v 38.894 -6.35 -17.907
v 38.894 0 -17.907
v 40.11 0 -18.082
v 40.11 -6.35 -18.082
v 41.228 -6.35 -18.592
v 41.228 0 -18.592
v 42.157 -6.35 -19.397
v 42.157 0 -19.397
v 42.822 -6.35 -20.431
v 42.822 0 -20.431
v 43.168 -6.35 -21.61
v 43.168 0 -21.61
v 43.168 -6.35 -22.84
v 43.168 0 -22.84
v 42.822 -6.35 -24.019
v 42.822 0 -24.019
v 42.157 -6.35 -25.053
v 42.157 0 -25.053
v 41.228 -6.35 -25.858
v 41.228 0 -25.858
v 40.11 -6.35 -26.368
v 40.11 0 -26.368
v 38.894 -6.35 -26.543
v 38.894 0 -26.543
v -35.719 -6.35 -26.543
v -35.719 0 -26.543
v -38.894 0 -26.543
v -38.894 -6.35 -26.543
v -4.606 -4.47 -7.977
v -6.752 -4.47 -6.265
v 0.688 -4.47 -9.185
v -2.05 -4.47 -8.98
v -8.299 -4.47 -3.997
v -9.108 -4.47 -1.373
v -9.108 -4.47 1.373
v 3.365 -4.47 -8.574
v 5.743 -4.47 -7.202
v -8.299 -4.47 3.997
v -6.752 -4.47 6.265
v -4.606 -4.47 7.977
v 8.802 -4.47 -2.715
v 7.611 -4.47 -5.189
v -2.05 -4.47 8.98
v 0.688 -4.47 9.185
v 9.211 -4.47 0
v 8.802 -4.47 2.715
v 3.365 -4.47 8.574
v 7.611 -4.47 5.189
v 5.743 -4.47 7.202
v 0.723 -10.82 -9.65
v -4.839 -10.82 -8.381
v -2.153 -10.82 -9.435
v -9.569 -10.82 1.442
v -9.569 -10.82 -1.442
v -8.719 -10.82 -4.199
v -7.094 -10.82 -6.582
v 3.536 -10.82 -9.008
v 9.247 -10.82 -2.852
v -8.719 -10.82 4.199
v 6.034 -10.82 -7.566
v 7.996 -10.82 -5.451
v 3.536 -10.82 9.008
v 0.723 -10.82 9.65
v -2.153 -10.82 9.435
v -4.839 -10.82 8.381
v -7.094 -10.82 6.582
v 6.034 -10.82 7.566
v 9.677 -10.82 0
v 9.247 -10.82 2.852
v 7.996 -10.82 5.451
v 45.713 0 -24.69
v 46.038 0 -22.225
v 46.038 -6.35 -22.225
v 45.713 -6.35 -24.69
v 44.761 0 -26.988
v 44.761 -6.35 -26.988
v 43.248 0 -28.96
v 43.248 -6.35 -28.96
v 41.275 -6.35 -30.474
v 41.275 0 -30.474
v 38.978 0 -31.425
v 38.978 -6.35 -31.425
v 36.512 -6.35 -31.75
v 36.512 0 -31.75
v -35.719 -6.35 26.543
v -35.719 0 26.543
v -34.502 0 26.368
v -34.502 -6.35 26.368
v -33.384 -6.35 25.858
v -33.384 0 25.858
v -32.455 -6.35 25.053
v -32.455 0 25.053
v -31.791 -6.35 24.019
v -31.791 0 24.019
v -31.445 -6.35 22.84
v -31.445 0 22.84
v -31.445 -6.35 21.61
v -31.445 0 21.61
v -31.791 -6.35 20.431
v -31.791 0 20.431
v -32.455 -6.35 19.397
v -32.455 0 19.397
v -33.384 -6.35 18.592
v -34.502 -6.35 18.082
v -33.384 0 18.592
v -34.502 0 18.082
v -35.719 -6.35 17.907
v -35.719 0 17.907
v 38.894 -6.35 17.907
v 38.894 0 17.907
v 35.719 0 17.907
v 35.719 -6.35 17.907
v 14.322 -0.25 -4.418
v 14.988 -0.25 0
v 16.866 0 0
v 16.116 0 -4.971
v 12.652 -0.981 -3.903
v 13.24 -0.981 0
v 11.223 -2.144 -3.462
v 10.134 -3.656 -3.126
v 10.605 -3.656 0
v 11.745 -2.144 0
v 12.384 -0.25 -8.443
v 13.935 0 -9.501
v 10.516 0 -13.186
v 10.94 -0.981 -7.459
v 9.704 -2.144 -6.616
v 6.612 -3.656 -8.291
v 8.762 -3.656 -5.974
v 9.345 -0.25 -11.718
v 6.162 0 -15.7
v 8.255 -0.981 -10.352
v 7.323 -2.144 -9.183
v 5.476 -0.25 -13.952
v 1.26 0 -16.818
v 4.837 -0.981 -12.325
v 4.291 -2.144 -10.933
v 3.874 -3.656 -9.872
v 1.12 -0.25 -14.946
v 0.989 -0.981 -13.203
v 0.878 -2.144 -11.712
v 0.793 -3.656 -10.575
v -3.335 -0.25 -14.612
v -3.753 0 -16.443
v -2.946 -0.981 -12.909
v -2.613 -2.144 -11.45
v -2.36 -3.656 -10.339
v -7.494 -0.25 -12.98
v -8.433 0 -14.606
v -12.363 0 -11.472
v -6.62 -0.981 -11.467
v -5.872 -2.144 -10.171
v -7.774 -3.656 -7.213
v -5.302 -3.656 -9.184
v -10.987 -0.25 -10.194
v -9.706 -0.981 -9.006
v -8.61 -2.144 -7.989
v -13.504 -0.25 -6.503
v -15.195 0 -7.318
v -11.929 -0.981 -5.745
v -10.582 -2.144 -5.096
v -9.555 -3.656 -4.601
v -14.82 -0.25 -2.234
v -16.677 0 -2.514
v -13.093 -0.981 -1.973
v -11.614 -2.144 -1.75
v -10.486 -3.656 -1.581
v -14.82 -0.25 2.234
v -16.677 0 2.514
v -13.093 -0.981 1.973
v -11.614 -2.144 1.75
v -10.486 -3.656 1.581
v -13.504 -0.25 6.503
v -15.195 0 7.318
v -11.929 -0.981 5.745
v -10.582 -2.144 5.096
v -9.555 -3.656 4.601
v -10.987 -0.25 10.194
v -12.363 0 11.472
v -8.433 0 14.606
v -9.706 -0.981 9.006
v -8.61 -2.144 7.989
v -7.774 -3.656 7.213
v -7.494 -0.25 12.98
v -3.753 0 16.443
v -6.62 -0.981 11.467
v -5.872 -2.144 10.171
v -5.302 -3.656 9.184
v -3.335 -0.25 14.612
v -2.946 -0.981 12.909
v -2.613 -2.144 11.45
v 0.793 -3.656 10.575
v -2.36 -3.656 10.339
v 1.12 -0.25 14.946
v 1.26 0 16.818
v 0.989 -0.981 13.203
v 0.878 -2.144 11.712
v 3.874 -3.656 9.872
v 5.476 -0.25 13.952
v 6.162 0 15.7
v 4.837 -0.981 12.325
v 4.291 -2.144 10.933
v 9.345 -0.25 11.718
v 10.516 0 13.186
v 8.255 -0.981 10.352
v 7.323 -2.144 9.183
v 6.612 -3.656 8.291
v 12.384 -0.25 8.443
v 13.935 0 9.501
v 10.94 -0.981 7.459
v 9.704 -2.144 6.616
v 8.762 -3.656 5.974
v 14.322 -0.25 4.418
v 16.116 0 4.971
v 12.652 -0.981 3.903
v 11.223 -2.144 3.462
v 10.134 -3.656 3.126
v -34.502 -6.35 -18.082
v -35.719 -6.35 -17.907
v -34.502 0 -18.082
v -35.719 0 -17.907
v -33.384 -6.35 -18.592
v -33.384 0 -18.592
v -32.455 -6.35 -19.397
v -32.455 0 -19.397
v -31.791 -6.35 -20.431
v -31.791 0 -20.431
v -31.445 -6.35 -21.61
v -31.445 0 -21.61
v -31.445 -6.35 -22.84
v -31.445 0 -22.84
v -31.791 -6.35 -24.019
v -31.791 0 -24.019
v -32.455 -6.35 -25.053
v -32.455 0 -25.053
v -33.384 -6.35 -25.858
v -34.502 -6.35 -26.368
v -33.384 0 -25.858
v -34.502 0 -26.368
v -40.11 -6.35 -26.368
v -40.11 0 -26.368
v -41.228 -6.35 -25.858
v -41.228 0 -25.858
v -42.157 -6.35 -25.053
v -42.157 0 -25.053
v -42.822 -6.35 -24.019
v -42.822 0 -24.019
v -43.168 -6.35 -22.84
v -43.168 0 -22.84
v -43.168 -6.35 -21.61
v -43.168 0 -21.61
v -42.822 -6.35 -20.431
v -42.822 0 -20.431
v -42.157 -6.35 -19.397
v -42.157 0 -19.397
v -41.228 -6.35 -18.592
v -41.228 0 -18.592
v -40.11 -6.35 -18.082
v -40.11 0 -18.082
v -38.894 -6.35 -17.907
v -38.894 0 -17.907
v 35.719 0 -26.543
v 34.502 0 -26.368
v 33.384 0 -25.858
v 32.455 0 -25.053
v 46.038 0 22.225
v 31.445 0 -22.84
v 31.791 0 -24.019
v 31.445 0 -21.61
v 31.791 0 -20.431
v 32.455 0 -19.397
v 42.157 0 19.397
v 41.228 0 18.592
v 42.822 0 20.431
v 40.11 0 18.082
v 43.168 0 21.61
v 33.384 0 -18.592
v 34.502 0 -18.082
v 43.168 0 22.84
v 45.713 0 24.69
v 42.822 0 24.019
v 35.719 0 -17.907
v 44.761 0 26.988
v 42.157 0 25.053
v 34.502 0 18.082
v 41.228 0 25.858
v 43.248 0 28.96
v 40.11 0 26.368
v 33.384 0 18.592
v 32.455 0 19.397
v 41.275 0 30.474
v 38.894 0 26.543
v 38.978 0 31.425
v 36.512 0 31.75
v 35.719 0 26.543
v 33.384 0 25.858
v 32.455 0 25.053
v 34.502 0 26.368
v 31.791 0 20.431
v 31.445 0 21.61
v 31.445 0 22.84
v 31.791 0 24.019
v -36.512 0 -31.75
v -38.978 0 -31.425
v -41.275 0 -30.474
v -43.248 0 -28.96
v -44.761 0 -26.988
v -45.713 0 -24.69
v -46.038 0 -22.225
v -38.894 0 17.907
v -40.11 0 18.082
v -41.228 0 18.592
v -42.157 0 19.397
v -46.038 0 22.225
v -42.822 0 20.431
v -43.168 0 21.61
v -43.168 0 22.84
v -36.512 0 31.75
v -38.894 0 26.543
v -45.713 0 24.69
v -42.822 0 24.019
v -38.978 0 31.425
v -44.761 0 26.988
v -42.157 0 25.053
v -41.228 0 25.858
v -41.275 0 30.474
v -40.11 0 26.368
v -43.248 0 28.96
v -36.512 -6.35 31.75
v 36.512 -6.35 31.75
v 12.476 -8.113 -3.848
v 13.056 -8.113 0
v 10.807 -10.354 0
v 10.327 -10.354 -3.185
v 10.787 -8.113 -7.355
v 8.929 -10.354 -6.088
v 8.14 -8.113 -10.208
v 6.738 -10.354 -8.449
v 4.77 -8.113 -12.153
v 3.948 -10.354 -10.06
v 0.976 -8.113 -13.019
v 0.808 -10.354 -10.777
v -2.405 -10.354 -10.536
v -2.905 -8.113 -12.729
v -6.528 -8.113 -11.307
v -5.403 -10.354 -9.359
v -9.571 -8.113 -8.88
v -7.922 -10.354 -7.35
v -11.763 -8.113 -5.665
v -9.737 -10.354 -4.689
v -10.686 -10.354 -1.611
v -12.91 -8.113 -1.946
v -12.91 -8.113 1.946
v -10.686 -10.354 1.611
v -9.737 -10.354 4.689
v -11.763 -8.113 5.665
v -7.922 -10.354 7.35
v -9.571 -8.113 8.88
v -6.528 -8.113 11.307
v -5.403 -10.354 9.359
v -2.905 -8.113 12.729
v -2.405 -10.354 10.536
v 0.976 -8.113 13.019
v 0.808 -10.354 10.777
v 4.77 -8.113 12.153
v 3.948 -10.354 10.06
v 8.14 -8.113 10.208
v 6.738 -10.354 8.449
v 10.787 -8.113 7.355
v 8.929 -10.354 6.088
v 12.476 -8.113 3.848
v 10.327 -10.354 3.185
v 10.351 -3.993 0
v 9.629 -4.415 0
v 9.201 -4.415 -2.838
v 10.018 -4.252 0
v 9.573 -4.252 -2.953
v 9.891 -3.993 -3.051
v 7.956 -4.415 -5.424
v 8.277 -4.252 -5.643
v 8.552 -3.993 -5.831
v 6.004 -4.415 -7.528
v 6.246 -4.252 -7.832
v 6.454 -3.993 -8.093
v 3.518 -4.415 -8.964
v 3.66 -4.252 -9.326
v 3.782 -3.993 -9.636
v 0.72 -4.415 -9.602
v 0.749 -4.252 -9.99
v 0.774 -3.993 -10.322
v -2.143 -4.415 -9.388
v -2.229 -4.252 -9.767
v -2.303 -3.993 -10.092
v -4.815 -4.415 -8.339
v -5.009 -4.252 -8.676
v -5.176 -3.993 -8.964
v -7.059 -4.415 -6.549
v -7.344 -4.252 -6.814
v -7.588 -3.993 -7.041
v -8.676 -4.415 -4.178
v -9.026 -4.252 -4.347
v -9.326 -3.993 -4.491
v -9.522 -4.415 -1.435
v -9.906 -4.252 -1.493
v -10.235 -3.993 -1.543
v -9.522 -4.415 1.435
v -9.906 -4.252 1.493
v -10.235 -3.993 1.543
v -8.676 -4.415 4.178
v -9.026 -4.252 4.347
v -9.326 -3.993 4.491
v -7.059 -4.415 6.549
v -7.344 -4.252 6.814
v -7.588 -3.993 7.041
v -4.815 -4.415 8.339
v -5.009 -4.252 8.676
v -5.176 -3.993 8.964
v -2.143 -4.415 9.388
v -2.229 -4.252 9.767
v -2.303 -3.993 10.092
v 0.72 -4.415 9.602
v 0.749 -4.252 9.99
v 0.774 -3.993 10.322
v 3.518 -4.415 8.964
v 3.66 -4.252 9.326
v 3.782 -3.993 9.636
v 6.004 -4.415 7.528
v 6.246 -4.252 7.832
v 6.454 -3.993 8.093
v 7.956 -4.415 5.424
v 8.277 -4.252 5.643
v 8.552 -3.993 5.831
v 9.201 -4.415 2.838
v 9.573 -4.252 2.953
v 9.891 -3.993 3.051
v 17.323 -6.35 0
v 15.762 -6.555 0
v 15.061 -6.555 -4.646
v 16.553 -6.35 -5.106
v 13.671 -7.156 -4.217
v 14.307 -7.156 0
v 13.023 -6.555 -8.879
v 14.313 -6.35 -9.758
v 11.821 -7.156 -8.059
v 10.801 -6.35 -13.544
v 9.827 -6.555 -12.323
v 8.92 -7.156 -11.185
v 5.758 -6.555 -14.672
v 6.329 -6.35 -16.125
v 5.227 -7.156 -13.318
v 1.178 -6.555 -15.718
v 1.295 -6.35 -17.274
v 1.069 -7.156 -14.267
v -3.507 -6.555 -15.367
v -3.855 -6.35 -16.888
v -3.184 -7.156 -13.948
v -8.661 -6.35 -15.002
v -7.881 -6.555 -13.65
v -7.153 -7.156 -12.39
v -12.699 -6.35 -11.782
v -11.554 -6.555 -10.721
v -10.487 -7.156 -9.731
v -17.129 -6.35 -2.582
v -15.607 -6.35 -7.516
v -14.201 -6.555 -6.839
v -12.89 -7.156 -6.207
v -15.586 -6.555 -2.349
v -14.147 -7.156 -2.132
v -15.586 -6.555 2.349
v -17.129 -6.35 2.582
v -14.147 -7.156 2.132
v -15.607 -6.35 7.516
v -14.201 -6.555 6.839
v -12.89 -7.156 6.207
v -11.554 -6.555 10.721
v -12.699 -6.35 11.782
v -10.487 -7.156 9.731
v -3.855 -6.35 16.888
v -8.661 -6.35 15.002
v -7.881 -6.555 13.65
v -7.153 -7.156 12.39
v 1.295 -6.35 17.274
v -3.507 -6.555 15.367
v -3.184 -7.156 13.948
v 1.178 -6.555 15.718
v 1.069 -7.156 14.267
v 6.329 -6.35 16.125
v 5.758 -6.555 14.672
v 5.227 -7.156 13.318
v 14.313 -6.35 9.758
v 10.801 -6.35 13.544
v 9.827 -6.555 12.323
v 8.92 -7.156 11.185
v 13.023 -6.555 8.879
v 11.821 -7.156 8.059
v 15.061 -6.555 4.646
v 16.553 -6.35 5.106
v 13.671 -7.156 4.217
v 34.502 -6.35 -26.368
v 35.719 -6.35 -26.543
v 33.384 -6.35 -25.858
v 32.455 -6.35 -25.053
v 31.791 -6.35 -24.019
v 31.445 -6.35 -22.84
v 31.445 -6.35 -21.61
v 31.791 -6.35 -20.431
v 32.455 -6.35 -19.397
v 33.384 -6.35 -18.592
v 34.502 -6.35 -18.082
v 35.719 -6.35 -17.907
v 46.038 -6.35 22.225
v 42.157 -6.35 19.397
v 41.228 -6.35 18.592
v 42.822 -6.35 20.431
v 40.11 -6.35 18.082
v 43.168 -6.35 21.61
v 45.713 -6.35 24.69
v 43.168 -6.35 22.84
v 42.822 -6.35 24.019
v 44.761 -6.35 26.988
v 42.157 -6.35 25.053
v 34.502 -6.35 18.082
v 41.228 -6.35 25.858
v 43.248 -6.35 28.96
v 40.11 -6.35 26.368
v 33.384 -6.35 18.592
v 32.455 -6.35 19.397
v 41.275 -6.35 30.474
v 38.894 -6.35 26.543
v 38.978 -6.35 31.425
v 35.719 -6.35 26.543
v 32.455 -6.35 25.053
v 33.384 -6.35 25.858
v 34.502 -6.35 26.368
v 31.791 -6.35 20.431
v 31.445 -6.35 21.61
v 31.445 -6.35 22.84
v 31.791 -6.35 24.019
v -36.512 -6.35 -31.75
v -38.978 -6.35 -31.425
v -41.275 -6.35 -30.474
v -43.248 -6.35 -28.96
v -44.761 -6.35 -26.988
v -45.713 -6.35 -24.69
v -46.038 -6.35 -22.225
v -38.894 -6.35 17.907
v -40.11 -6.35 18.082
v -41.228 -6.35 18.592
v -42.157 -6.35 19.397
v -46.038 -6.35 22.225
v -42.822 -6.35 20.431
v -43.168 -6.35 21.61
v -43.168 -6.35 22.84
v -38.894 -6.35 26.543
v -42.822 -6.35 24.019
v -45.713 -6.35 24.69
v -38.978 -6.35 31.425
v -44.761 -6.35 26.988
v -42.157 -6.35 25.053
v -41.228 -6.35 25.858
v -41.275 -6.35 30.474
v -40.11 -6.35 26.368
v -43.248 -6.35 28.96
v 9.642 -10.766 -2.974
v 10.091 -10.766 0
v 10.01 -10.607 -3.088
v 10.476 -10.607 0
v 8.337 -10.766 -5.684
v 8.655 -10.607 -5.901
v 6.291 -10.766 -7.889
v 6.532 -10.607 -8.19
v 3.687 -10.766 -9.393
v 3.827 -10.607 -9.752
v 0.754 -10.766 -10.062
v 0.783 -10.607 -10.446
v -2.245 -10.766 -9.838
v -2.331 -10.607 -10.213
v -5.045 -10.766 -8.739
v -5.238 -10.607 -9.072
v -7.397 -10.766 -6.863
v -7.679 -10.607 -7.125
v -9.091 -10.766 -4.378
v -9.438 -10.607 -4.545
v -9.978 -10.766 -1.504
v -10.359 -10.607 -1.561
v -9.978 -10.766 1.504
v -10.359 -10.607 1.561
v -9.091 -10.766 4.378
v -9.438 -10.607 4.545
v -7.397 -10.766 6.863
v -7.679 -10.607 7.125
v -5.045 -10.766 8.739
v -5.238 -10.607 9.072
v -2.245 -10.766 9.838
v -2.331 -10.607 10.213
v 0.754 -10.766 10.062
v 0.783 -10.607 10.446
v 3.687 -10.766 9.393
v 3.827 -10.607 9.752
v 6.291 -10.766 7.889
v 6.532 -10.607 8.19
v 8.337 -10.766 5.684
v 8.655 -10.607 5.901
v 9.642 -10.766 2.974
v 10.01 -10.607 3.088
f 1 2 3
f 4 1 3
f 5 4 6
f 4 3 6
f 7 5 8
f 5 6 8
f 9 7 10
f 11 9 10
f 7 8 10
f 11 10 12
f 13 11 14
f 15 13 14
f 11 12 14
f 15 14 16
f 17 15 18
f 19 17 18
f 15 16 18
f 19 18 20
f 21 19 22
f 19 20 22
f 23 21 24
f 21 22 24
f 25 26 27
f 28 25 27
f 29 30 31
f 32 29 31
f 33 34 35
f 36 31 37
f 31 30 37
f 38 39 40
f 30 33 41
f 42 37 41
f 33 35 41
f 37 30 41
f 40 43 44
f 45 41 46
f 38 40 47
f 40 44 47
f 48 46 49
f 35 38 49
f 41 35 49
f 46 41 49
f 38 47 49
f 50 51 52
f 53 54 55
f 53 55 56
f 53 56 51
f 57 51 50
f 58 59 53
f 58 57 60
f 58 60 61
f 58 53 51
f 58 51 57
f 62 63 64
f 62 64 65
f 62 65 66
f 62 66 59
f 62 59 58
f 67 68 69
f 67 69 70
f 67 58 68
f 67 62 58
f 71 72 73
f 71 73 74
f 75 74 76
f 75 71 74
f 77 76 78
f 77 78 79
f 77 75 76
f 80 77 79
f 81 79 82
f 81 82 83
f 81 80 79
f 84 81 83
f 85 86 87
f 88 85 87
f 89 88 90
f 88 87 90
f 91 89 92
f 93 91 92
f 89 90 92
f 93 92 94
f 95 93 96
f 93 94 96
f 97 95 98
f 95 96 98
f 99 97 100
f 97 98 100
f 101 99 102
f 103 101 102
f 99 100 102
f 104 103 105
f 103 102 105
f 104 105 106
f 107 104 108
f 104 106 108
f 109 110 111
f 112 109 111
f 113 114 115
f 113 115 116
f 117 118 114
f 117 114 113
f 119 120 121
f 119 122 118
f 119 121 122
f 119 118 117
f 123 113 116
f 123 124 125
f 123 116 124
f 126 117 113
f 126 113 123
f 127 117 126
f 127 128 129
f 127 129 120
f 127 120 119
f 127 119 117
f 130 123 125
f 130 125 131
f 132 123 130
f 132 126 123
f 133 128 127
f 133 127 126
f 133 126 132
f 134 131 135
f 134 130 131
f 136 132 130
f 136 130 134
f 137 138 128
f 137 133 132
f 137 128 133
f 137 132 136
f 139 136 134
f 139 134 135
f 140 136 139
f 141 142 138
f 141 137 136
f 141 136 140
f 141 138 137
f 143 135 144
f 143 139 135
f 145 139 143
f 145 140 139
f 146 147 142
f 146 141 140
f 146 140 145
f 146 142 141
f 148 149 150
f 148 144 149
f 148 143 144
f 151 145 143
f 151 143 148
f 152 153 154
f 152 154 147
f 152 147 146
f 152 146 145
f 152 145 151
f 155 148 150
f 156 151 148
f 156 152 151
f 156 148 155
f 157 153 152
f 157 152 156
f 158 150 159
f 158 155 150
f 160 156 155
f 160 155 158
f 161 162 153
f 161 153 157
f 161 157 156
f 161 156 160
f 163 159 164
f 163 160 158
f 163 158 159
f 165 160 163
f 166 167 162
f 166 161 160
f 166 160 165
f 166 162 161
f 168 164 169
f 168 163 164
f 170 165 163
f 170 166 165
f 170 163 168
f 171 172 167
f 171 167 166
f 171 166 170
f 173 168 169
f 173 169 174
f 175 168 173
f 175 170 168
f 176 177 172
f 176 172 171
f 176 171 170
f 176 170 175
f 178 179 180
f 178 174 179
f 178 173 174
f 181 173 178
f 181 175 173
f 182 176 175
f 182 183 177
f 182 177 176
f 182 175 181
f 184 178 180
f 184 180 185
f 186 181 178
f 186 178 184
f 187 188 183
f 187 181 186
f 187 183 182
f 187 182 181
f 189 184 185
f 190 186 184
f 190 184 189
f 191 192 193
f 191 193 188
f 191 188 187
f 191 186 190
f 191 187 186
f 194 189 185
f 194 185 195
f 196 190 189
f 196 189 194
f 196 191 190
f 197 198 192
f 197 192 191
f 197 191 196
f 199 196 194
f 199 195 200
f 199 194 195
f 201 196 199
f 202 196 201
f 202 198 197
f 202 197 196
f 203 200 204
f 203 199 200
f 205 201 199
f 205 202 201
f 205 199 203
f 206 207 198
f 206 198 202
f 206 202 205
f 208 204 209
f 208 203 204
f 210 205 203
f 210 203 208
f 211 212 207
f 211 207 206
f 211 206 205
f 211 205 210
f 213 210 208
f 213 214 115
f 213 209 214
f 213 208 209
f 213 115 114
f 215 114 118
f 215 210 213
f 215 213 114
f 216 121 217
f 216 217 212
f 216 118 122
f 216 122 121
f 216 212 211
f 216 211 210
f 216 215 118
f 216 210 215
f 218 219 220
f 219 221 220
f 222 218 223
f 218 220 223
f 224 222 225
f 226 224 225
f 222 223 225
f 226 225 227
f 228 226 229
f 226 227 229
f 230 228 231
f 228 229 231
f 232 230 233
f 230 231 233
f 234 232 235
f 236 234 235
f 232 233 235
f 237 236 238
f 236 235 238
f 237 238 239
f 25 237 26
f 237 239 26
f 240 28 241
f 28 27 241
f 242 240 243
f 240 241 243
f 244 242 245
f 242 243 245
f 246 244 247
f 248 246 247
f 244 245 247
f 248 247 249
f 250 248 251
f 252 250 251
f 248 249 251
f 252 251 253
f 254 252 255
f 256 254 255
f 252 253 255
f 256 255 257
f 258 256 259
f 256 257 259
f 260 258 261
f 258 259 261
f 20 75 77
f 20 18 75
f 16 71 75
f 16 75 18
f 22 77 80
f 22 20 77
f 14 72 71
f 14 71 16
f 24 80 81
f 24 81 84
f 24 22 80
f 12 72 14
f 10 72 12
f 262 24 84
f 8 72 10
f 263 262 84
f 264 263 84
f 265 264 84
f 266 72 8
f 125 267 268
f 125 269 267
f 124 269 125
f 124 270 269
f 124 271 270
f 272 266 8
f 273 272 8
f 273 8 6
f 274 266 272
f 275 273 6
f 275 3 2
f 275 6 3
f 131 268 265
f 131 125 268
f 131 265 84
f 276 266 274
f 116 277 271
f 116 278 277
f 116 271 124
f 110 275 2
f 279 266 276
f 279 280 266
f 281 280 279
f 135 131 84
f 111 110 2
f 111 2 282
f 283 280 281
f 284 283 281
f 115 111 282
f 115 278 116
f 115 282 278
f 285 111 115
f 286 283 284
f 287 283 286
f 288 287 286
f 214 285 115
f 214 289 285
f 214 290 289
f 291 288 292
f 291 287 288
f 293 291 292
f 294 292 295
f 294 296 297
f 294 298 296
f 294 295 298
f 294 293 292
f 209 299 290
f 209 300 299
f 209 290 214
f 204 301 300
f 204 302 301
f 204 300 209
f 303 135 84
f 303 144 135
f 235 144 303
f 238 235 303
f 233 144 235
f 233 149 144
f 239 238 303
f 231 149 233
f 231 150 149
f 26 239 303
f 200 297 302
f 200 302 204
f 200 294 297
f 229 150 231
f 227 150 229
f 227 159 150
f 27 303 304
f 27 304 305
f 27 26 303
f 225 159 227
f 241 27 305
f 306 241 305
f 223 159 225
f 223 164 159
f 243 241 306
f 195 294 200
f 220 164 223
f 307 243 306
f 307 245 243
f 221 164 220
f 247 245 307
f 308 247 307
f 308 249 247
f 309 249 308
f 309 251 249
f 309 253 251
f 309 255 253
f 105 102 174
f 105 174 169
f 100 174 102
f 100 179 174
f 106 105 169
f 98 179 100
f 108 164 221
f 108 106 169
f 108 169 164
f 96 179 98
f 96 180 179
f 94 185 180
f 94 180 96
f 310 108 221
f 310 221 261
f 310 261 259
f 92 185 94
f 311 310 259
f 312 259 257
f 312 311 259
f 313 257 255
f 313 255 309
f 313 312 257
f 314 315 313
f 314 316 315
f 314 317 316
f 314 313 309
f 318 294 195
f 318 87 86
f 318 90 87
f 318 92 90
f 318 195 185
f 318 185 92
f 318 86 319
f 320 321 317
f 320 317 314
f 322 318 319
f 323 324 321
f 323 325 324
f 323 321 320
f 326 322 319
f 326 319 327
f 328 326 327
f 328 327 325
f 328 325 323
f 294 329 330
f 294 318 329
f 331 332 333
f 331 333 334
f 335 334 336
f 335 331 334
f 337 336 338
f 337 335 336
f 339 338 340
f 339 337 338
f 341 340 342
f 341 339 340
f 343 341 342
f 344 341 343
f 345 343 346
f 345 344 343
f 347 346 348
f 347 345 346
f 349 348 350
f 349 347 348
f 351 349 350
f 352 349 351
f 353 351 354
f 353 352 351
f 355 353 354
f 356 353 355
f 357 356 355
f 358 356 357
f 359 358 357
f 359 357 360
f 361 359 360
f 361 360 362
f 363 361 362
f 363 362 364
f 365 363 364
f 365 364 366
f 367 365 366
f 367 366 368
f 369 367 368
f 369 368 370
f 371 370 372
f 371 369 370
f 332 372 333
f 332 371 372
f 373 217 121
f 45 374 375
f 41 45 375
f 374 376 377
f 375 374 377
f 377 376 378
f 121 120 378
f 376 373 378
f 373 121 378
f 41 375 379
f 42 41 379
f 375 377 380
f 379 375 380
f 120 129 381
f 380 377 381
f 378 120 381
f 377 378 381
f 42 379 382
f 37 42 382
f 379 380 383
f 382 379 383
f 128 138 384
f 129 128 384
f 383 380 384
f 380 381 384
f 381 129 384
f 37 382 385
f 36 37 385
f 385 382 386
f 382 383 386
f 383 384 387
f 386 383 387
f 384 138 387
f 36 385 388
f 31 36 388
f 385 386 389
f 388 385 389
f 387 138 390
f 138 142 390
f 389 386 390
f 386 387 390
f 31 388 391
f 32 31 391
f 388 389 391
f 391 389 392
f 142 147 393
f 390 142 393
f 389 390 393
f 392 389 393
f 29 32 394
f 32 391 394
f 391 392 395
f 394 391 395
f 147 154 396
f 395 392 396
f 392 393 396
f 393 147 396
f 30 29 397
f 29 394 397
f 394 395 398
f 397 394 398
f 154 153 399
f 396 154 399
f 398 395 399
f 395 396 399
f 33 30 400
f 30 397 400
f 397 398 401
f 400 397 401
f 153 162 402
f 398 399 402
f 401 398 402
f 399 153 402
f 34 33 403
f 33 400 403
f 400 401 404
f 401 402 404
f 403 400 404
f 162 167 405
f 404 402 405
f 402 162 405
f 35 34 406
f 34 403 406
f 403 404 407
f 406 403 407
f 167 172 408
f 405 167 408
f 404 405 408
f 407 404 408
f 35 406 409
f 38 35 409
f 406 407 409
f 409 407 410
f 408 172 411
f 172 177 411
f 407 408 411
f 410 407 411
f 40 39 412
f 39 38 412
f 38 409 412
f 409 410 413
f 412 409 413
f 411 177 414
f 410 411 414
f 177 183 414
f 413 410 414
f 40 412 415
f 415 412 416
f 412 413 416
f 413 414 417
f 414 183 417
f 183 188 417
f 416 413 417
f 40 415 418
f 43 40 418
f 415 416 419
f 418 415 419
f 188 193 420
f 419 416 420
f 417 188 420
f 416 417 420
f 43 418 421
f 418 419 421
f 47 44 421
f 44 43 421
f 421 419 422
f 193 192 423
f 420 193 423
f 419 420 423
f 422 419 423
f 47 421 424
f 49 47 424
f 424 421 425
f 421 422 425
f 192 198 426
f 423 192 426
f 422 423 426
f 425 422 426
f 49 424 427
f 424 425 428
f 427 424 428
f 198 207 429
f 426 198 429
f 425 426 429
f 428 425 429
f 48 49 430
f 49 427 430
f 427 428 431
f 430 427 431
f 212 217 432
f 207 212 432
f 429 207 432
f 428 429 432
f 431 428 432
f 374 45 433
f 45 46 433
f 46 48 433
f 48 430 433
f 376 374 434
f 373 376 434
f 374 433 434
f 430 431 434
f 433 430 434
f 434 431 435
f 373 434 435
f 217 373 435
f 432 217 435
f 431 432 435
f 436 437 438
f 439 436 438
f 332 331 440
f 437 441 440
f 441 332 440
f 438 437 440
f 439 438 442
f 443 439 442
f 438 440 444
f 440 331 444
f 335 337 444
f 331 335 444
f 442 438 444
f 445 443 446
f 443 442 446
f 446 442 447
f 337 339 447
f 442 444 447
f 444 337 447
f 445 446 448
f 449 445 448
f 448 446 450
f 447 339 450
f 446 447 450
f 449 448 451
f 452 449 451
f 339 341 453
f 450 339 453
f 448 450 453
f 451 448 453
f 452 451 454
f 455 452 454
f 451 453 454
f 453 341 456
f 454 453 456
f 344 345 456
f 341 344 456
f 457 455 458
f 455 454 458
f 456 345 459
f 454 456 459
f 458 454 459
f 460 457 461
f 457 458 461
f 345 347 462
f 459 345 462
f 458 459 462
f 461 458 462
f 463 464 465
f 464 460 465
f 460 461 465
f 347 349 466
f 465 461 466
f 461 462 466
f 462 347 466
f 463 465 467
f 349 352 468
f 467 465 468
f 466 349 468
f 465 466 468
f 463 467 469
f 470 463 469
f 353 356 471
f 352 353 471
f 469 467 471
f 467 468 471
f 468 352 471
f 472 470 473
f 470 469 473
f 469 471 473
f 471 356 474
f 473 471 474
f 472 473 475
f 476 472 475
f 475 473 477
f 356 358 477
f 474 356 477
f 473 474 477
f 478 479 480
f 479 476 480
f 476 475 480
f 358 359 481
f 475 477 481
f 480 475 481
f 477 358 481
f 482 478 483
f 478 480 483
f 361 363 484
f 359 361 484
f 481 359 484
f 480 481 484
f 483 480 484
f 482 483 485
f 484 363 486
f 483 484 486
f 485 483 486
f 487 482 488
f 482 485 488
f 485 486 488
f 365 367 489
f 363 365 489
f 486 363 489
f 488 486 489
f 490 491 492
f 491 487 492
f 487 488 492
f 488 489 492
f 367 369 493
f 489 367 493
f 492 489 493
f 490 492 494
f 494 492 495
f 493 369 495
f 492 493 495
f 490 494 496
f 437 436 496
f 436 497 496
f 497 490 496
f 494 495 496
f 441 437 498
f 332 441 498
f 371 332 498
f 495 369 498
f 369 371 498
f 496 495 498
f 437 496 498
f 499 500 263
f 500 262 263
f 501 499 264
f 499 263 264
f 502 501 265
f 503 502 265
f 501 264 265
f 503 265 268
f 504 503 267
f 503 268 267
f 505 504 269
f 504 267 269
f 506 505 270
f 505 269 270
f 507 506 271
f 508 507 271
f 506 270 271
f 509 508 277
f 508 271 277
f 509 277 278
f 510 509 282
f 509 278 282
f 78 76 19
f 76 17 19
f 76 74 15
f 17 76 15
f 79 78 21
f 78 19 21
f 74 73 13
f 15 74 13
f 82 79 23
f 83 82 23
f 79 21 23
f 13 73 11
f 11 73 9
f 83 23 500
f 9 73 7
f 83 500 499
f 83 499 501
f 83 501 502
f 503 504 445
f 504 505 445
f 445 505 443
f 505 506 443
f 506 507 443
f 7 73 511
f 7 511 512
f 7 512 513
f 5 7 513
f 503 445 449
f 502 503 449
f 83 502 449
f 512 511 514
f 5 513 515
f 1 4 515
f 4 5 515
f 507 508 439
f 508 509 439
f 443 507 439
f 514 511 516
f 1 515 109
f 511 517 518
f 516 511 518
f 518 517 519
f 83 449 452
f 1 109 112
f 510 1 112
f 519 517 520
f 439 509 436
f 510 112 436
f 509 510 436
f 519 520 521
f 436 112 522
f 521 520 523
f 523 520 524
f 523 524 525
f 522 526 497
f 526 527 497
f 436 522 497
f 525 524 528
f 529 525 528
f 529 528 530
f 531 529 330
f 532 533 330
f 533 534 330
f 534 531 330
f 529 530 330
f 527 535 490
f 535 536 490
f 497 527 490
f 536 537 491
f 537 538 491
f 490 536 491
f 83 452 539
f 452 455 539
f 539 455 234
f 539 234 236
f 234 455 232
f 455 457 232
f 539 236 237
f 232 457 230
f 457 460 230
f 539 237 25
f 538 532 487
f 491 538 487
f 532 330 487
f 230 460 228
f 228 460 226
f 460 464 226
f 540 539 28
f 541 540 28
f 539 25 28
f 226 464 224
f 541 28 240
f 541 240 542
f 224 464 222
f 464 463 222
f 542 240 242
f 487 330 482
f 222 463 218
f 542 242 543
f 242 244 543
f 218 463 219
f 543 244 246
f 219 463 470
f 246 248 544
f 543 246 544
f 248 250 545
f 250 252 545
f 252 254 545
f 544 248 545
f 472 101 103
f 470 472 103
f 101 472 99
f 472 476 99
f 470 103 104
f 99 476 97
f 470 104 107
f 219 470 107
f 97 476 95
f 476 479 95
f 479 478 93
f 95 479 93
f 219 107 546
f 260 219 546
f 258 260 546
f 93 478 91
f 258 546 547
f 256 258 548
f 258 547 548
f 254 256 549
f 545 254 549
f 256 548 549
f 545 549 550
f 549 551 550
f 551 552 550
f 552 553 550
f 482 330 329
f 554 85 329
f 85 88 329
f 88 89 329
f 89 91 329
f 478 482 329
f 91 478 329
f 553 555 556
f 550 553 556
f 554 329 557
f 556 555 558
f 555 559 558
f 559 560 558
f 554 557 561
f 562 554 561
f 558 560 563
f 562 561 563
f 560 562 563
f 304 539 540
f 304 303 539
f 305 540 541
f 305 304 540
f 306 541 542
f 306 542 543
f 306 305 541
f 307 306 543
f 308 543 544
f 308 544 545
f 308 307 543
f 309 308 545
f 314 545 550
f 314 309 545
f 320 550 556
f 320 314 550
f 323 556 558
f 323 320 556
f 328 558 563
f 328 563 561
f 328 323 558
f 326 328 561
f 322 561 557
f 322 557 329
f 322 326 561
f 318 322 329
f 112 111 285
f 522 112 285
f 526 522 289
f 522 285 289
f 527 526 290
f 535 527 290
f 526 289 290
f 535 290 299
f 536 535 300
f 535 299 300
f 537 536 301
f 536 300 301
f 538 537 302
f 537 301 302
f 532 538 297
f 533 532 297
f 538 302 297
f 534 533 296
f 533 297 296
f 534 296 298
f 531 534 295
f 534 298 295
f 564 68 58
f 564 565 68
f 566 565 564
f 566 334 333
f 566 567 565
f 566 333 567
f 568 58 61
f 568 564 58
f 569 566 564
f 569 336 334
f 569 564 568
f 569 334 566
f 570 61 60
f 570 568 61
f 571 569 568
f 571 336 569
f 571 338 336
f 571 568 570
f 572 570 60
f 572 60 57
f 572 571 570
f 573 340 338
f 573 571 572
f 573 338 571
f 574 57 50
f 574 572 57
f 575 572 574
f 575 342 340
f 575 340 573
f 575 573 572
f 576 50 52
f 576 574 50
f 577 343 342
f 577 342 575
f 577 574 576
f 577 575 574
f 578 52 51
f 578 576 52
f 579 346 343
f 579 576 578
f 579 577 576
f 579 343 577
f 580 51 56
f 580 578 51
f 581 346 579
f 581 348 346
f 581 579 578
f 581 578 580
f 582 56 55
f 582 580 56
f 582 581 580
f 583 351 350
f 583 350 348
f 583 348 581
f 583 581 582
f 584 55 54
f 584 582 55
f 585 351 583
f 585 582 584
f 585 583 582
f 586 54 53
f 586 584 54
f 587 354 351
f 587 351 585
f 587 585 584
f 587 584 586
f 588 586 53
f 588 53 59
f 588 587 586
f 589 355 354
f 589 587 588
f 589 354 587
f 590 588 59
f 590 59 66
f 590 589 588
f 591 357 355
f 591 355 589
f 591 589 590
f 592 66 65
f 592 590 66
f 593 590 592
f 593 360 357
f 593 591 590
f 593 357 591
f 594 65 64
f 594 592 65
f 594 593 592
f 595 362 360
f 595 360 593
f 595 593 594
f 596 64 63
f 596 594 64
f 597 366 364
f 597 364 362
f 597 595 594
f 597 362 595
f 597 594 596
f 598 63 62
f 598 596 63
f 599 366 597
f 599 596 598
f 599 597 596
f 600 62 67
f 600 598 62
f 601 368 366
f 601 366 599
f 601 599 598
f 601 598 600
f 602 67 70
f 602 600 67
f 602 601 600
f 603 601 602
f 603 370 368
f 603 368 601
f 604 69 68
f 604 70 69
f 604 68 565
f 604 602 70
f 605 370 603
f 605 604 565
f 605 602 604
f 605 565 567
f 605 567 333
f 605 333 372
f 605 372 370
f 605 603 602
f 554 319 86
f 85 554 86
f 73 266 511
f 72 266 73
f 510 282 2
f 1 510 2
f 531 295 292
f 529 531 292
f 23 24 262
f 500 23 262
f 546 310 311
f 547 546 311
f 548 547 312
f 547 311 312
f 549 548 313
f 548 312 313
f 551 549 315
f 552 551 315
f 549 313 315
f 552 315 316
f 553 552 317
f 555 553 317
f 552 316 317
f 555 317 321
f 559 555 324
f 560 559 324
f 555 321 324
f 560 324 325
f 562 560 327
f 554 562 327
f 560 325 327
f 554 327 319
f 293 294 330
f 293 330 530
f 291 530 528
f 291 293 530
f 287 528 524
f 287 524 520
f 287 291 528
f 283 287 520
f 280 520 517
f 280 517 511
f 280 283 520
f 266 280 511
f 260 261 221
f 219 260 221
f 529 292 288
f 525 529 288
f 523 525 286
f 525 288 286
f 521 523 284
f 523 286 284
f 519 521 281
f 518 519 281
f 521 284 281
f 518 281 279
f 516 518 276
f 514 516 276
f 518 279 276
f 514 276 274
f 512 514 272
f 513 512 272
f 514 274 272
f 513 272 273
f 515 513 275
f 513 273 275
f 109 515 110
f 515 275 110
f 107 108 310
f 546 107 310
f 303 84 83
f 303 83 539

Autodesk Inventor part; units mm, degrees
sketch "Sketch_1" plane through (0, 0, 0) normal (0, 0, 1) x (1, 0, 0)
  line L0 (0, -10.8204) -> (0, -4.4704)
  line L1 (0, -4.4704) -> (9.2111, -4.4704)
  arc A0 (9.2111, -4.4704) -> (10.6049, -3.6564) centre (9.2111, -2.8702) ccw
  arc A1 (16.8656, 0) -> (10.6049, -3.6564) centre (16.8656, -7.1882) ccw
  line L2 (16.8656, 0) -> (25.4, 0)
  line L3 (25.4, 0) -> (25.4, -6.35)
  line L4 (25.4, -6.35) -> (17.3228, -6.35)
  arc A2 (17.3228, -6.35) -> (13.056, -8.1128) centre (17.3228, -12.3952) ccw
  line L5 (13.056, -8.1128) -> (10.8068, -10.3538)
  arc A3 (9.6774, -10.8204) -> (10.8068, -10.3538) centre (9.6774, -9.2202) ccw
  line L6 (9.6774, -10.8204) -> (0, -10.8204)
  line L7 (0, -10.8204) -> (0, -4.4704)
revolve "Revolution1" add sketch "Sketch_1" angle 360 about axis through (0, -10.8204, 0) along (0, -1, 0)
sketch "Sketch_2" plane through (0, 0, 0) normal (0, 1, 0) x (-1, 0, 0)
  line L0 (46.0375, 0) -> (25.4, 0)
  arc A0 (-25.4, 0) -> (25.4, 0) centre (0, 0) ccw
  line L1 (-25.4, 0) -> (-46.0375, 0)
  line L2 (-46.0375, 0) -> (-46.0375, -22.225)
  arc A1 (-46.0375, -22.225) -> (-36.5125, -31.75) centre (-36.5125, -22.225) ccw
  line L3 (-36.5125, -31.75) -> (36.5125, -31.75)
  arc A2 (36.5125, -31.75) -> (46.0375, -22.225) centre (36.5125, -22.225) ccw
  line L4 (46.0375, -22.225) -> (46.0375, 0)
  arc A3 (-35.7188, -26.543) -> (-35.7188, -17.907) centre (-35.7187, -22.225) ccw
  line L5 (-35.7188, -17.907) -> (-38.8937, -17.907)
  arc A4 (-38.8937, -17.907) -> (-38.8937, -26.543) centre (-38.8938, -22.225) ccw
  line L6 (-38.8937, -26.543) -> (-35.7188, -26.543)
  arc A5 (38.8937, -26.543) -> (38.8937, -17.907) centre (38.8938, -22.225) ccw
  line L7 (38.8937, -17.907) -> (35.7188, -17.907)
  arc A6 (35.7188, -17.907) -> (35.7188, -26.543) centre (35.7187, -22.225) ccw
  line L8 (35.7188, -26.543) -> (38.8937, -26.543)
extrude "Extrusion1" add sketch "Sketch_2" against normal blind 6.35
sketch "Sketch_3" plane through (0, 0, 0) normal (0, 1, 0) x (-1, 0, 0)
  line L0 (46.0375, 0) -> (46.0375, 22.225)
  arc A0 (46.0375, 22.225) -> (36.5125, 31.75) centre (36.5125, 22.225) ccw
  line L1 (36.5125, 31.75) -> (-36.5125, 31.75)
  arc A1 (-36.5125, 31.75) -> (-46.0375, 22.225) centre (-36.5125, 22.225) ccw
  line L2 (-46.0375, 22.225) -> (-46.0375, 0)
  line L3 (-46.0375, 0) -> (-25.4, 0)
  arc A2 (25.4, 0) -> (-25.4, 0) centre (0, 0) ccw
  line L4 (25.4, 0) -> (46.0375, 0)
  arc A3 (-35.7188, 17.907) -> (-35.7188, 26.543) centre (-35.7187, 22.225) ccw
  line L5 (-35.7188, 26.543) -> (-38.8937, 26.543)
  arc A4 (-38.8937, 26.543) -> (-38.8937, 17.907) centre (-38.8938, 22.225) ccw
  line L6 (-38.8937, 17.907) -> (-35.7188, 17.907)
  arc A5 (38.8937, 17.907) -> (38.8937, 26.543) centre (38.8938, 22.225) ccw
  line L7 (38.8937, 26.543) -> (35.7188, 26.543)
  arc A6 (35.7188, 26.543) -> (35.7188, 17.907) centre (35.7187, 22.225) ccw
  line L8 (35.7188, 17.907) -> (38.8937, 17.907)
extrude "Extrusion2" add sketch "Sketch_3" against normal blind 6.35
ref_plane "to_rivet_XY" through (0, -4.4704, 0) normal (0, 1, 0) x (1, 0, 0)
ref_plane "to_rivet_YZ" through (0, -4.4704, 0) normal (1, 0, 0) x (0, 0, -1)
ref_plane "to_rivet_ZX" through (0, -4.4704, 0) normal (0, 0, -1) x (0, 1, 0)
ref_plane "to_upper_race_XY" through (0, -6.35, 0) normal (0, 1, 0) x (1, 0, 0)
ref_plane "to_upper_race_YZ" through (0, -6.35, 0) normal (1, 0, 0) x (0, 0, -1)
ref_plane "to_upper_race_ZX" through (0, -6.35, 0) normal (0, 0, -1) x (0, 1, 0)
ref_plane "top_plate_XY" through (0, 0, 0) normal (0, -1, 0) x (1, 0, 0)
ref_plane "top_plate_YZ" through (0, 0, 0) normal (1, 0, 0) x (0, 0, 1)
ref_plane "top_plate_ZX" through (0, 0, 0) normal (0, 0, 1) x (0, -1, 0)
properties part number "2SS-TP"
